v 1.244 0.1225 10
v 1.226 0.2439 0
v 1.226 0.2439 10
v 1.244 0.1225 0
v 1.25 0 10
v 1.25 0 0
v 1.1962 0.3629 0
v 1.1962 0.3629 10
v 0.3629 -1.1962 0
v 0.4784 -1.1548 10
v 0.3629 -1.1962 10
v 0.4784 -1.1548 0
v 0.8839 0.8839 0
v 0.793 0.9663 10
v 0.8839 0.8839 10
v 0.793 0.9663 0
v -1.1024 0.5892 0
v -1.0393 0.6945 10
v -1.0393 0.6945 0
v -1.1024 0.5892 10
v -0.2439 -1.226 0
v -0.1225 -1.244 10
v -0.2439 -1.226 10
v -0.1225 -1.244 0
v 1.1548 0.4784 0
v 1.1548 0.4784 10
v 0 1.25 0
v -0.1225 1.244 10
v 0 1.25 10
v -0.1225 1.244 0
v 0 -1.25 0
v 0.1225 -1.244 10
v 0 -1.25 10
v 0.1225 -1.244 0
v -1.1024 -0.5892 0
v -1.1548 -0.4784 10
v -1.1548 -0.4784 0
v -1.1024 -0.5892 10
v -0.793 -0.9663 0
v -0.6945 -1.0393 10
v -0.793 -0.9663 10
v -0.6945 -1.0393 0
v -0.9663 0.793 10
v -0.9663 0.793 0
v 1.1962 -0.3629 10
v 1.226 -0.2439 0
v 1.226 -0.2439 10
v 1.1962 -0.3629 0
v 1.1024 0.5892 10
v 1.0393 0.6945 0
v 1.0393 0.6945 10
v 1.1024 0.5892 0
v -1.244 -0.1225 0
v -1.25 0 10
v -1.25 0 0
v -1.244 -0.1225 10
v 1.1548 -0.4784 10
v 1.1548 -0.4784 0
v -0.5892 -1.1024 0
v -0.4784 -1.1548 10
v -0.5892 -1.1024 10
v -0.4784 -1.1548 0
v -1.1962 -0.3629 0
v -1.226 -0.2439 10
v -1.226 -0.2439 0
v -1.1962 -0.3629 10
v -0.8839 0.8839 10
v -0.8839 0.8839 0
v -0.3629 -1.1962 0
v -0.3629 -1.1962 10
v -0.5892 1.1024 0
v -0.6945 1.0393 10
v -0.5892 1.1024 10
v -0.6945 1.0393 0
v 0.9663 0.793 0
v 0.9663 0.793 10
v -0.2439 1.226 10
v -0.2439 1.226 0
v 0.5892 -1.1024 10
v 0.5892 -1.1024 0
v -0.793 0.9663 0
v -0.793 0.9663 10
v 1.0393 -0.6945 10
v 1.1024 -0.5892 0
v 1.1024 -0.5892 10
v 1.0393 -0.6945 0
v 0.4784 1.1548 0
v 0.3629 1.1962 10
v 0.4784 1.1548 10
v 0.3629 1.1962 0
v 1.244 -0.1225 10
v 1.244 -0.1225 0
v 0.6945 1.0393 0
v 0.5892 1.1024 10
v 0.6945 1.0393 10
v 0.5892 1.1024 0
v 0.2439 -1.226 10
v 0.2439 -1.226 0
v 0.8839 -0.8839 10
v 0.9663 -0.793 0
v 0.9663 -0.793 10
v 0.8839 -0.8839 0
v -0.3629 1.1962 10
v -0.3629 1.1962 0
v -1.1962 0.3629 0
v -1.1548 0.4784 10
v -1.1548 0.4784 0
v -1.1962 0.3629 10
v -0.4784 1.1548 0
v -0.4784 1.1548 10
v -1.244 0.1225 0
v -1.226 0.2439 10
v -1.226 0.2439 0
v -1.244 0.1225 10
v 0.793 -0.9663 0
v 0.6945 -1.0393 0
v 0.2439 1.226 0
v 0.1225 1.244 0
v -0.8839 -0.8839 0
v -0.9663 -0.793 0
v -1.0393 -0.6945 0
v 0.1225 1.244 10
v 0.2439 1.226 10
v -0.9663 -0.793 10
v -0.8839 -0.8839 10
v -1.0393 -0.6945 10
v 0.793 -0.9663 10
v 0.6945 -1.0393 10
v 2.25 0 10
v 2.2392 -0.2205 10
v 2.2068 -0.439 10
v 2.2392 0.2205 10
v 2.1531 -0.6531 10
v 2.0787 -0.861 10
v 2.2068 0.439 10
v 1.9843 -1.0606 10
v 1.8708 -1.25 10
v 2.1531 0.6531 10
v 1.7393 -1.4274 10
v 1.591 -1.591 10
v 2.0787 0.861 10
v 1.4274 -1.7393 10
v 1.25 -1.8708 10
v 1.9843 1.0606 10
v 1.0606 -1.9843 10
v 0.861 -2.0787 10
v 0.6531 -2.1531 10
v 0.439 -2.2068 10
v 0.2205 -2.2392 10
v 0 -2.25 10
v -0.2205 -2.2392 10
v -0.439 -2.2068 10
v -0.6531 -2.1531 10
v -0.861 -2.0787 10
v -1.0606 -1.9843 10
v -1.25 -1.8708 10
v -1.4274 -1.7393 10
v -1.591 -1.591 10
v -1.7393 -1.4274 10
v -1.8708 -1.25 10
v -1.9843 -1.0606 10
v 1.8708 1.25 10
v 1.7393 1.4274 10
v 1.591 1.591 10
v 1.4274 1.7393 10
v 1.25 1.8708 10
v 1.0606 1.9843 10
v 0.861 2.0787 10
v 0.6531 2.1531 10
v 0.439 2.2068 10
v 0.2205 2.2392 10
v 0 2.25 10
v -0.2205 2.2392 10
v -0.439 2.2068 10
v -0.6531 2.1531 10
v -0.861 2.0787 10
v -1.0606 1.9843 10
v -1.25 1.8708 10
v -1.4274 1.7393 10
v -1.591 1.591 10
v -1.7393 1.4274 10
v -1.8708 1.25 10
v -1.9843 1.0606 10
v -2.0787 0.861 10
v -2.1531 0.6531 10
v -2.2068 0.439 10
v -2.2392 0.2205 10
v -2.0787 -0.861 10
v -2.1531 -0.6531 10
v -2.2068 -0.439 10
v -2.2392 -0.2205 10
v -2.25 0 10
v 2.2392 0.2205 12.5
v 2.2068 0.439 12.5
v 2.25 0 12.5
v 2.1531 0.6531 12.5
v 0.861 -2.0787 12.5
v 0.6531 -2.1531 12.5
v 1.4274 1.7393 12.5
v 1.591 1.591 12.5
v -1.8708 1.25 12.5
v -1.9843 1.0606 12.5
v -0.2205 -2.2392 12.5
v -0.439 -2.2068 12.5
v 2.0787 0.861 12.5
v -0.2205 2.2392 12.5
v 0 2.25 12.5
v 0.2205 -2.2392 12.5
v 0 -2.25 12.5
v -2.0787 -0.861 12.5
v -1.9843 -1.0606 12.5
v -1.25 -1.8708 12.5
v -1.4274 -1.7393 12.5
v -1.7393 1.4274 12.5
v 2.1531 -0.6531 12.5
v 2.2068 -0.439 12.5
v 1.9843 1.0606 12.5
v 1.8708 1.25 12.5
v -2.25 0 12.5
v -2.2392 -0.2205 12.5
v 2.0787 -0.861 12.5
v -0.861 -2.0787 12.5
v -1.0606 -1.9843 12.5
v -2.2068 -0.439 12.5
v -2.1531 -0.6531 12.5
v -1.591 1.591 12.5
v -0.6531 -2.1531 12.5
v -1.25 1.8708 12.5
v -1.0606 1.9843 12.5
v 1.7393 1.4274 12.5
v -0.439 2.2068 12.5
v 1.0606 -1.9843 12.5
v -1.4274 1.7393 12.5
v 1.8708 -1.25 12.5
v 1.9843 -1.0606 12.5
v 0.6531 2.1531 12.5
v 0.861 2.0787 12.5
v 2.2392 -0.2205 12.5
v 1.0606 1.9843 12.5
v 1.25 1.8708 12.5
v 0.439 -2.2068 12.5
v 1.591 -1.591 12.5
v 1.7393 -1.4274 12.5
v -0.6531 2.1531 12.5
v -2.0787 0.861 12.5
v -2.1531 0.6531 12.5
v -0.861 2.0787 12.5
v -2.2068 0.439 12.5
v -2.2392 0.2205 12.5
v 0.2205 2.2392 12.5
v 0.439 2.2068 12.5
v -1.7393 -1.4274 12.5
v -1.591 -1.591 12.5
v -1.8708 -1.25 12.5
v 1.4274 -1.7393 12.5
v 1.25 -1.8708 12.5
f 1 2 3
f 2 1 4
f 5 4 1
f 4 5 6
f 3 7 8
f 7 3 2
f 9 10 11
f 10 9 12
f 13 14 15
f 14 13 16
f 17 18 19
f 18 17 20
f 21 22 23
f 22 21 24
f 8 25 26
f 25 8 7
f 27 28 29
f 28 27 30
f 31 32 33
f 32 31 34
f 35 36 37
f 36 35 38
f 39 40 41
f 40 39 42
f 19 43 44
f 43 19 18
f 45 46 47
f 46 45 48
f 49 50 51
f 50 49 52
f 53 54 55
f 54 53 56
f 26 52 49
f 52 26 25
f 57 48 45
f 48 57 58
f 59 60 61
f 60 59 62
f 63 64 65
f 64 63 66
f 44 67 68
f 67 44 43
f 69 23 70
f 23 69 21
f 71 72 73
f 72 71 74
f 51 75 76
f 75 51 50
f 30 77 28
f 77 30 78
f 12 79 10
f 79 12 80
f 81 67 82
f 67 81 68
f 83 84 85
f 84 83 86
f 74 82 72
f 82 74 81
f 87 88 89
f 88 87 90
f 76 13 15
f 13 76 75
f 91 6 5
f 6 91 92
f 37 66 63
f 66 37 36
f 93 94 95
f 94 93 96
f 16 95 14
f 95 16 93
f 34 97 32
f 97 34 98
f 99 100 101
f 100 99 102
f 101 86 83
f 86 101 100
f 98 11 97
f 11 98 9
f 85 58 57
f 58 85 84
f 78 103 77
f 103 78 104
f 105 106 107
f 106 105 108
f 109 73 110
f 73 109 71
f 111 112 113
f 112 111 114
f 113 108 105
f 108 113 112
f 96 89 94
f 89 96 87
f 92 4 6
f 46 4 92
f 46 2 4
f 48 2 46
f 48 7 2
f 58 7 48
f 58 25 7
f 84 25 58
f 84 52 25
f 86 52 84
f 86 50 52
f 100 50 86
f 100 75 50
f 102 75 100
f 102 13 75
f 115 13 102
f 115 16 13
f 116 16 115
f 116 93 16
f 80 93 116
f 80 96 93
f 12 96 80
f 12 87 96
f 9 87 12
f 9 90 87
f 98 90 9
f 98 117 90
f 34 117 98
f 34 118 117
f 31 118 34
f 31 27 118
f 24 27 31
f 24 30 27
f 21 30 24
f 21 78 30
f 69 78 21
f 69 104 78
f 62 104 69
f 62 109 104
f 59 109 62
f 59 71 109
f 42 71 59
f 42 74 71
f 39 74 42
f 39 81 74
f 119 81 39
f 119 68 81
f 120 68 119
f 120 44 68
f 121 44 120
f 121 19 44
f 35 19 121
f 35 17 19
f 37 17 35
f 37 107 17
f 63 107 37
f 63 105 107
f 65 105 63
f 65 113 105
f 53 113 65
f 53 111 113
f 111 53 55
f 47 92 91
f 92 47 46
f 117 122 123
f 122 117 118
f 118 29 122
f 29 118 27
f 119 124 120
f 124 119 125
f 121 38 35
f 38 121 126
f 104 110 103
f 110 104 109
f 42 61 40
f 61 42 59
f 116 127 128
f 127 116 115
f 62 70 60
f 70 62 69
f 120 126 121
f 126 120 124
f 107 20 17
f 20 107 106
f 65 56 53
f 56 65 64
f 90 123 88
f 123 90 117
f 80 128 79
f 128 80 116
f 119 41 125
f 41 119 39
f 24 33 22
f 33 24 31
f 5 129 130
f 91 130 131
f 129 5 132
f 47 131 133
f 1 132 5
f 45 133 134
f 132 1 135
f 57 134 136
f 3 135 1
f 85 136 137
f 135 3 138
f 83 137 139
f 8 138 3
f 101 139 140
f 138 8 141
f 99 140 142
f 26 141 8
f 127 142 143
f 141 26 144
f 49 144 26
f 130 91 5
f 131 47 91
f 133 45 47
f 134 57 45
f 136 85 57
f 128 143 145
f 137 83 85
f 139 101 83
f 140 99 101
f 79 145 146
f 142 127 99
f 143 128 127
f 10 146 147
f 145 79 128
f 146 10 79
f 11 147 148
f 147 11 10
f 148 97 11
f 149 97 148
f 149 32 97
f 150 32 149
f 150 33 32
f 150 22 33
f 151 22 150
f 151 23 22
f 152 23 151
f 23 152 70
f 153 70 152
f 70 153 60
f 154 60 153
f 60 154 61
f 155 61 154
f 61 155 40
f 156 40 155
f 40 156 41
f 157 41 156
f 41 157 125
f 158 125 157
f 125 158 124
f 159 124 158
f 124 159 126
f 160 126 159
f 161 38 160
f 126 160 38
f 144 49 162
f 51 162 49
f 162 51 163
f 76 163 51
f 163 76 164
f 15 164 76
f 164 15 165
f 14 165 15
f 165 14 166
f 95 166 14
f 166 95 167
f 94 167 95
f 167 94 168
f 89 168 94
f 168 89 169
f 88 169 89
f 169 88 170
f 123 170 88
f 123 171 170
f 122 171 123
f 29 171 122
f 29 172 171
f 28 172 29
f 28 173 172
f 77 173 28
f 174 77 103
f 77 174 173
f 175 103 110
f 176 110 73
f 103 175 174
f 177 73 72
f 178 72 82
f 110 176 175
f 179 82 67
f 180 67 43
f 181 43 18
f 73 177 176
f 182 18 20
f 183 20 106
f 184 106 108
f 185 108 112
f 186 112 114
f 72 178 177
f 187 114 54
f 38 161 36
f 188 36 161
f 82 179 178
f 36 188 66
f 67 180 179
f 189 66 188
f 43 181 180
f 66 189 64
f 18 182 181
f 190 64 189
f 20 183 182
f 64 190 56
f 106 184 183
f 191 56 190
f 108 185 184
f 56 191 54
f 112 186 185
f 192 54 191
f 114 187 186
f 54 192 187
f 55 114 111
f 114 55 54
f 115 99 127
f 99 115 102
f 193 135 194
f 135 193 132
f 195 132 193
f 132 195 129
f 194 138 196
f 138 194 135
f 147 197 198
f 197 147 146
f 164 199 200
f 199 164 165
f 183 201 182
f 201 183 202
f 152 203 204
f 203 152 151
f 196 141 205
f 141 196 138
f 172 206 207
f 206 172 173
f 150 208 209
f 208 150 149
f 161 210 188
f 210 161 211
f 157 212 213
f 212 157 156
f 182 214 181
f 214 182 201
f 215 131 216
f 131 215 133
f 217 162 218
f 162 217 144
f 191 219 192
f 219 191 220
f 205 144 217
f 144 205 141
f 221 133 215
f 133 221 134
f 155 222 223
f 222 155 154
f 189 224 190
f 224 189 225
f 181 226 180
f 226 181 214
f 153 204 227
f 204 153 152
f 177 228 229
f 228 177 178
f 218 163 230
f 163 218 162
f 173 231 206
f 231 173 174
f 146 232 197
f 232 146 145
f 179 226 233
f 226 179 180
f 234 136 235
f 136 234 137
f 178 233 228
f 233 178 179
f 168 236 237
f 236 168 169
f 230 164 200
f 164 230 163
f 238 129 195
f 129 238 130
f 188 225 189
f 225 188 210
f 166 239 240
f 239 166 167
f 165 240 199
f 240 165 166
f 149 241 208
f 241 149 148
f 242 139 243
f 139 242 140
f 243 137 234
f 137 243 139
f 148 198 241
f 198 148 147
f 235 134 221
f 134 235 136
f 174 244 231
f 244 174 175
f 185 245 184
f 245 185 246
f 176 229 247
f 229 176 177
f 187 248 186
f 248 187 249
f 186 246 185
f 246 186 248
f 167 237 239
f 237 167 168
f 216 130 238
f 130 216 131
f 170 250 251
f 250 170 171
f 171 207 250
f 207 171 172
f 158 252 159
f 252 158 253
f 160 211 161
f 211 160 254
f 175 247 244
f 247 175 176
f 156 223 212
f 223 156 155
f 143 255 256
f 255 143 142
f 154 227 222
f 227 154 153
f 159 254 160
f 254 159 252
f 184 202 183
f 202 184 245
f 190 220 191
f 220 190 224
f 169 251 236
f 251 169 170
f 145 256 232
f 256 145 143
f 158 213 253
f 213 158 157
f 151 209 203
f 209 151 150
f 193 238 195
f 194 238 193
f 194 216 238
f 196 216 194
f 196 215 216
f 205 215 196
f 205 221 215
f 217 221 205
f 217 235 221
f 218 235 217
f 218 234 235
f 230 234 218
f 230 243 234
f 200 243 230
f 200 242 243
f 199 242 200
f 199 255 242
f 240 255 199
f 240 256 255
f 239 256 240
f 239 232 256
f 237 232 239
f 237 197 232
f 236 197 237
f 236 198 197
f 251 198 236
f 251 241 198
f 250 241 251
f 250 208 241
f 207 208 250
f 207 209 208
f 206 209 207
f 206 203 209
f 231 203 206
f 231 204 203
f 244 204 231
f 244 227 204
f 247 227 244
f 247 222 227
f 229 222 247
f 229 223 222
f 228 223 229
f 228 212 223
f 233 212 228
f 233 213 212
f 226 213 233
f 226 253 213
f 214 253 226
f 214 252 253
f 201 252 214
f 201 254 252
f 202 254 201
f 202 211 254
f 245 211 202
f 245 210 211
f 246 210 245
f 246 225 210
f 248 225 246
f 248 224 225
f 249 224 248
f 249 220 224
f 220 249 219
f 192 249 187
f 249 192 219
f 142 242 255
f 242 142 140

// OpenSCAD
module socket_head_cap_screw() {
    union() {
        // Screw shaft
        cylinder(h=10, d=2.5, $fn=64);
        
        // Screw head
        translate([0, 0, 10])
            cylinder(h=2.5, d=4.5, $fn=64);
    }
}

socket_head_cap_screw();
